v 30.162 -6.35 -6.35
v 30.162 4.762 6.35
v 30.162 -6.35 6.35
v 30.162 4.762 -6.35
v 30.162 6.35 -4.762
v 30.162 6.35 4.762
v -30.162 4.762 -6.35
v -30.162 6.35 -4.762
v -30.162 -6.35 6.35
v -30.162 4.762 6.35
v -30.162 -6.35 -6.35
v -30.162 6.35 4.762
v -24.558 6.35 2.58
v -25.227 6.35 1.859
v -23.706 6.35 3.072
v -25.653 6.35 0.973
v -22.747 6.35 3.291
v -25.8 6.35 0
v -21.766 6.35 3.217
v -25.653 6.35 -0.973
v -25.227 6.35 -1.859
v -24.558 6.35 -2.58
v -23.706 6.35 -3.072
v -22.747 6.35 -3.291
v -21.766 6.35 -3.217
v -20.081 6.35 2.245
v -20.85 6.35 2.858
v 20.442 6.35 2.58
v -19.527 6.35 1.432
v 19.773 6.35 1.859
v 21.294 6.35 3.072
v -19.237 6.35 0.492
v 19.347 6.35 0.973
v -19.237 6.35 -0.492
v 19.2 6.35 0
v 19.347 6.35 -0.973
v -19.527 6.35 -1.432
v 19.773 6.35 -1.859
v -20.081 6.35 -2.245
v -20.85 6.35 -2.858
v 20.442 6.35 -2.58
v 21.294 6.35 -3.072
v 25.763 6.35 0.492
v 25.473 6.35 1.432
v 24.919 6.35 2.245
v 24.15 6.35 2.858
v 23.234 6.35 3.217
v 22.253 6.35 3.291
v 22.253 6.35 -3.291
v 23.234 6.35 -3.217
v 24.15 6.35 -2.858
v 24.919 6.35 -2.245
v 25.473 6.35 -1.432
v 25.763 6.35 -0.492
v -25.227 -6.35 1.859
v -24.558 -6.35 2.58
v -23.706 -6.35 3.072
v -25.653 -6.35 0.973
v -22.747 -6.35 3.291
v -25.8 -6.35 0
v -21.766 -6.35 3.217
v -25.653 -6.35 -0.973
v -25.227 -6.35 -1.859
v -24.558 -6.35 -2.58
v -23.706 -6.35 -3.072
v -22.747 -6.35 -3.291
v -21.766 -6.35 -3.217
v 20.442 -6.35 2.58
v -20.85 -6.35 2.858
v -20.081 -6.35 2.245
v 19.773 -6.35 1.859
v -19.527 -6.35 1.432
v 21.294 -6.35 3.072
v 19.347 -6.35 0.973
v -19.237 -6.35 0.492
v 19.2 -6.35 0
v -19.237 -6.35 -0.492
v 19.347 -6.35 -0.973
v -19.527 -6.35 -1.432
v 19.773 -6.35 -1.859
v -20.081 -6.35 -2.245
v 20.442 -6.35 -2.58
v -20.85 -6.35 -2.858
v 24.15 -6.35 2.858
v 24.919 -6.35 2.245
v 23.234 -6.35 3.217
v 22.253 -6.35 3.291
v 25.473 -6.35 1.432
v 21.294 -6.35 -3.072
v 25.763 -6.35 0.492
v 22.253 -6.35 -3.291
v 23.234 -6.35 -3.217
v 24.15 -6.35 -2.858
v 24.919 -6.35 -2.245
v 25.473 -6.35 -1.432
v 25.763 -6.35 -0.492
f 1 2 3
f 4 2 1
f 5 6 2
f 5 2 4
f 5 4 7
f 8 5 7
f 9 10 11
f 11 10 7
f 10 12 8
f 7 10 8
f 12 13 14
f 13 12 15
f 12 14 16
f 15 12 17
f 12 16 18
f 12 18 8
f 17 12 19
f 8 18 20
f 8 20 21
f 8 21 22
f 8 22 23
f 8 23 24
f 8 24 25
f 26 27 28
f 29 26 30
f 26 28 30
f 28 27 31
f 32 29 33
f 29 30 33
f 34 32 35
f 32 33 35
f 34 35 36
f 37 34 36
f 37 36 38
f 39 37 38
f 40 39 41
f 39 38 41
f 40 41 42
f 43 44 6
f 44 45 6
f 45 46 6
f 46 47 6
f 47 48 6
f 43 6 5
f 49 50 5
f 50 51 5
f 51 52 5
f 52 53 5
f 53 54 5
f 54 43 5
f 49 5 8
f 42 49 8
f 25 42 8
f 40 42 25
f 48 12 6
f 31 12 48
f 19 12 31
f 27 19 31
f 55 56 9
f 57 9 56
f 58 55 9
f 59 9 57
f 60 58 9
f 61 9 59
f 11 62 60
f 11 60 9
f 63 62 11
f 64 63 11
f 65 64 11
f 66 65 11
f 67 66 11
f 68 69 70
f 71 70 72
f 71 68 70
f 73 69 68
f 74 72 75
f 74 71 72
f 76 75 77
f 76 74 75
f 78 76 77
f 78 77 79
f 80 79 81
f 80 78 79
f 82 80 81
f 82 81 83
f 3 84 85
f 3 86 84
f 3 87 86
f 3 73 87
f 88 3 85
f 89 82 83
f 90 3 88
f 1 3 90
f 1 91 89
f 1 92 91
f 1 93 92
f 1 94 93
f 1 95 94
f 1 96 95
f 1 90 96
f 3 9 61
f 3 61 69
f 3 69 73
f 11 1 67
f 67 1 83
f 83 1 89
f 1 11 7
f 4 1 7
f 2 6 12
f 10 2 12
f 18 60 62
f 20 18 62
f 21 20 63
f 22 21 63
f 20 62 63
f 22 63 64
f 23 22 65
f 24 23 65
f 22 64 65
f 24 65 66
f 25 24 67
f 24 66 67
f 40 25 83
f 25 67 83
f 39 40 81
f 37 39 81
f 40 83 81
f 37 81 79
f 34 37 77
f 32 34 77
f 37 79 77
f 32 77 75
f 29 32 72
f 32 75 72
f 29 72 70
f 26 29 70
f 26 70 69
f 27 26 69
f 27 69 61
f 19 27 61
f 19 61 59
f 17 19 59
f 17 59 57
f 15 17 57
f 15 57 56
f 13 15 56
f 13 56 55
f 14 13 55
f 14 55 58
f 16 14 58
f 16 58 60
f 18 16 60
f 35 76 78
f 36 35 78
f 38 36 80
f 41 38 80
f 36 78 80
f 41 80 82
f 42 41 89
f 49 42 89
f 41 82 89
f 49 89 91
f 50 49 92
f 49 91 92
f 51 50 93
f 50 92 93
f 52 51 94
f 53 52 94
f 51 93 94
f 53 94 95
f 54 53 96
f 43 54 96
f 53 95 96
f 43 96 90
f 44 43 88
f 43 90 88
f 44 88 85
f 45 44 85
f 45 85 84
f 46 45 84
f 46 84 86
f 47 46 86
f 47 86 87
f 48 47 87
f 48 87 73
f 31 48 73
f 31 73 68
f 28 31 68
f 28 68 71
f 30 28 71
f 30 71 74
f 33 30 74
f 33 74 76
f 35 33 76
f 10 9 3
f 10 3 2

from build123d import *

# Parameters (mm, degrees)
SKETCH1_W            = 12.7
SKETCH1_H            = 12.7
BOSS_EXTRUDE1_DEPTH  = 30.1625
M6_CLEARANCE_HOLE1_D = 6.6
CHAMFER1_SIZE        = 1.5875


with BuildPart() as part:
    # Sketch1 → Boss-Extrude1 (new, symmetric)
    with BuildSketch(Plane(origin=(0, 0, 0), x_dir=(0, 0, -1), z_dir=(1, 0, 0))):
        Rectangle(SKETCH1_W, SKETCH1_H)
    extrude(amount=BOSS_EXTRUDE1_DEPTH, both=True)

    # M6 Clearance Hole1 (through all)
    with Locations(Plane(origin=(0, 6.35, 0), x_dir=(1, 0, 0), z_dir=(0, 1, 0))):
        with Locations((-22.5, 0), (22.5, 0)):
            Hole(M6_CLEARANCE_HOLE1_D / 2)

    # Chamfer1
    chamfer1_edges = [part.edges().sort_by_distance(p)[0] for p in [
        (0, 6.35, 6.35),
        (0, 6.35, -6.35),
    ]]
    chamfer(chamfer1_edges, length=CHAMFER1_SIZE)


solid = part.part
